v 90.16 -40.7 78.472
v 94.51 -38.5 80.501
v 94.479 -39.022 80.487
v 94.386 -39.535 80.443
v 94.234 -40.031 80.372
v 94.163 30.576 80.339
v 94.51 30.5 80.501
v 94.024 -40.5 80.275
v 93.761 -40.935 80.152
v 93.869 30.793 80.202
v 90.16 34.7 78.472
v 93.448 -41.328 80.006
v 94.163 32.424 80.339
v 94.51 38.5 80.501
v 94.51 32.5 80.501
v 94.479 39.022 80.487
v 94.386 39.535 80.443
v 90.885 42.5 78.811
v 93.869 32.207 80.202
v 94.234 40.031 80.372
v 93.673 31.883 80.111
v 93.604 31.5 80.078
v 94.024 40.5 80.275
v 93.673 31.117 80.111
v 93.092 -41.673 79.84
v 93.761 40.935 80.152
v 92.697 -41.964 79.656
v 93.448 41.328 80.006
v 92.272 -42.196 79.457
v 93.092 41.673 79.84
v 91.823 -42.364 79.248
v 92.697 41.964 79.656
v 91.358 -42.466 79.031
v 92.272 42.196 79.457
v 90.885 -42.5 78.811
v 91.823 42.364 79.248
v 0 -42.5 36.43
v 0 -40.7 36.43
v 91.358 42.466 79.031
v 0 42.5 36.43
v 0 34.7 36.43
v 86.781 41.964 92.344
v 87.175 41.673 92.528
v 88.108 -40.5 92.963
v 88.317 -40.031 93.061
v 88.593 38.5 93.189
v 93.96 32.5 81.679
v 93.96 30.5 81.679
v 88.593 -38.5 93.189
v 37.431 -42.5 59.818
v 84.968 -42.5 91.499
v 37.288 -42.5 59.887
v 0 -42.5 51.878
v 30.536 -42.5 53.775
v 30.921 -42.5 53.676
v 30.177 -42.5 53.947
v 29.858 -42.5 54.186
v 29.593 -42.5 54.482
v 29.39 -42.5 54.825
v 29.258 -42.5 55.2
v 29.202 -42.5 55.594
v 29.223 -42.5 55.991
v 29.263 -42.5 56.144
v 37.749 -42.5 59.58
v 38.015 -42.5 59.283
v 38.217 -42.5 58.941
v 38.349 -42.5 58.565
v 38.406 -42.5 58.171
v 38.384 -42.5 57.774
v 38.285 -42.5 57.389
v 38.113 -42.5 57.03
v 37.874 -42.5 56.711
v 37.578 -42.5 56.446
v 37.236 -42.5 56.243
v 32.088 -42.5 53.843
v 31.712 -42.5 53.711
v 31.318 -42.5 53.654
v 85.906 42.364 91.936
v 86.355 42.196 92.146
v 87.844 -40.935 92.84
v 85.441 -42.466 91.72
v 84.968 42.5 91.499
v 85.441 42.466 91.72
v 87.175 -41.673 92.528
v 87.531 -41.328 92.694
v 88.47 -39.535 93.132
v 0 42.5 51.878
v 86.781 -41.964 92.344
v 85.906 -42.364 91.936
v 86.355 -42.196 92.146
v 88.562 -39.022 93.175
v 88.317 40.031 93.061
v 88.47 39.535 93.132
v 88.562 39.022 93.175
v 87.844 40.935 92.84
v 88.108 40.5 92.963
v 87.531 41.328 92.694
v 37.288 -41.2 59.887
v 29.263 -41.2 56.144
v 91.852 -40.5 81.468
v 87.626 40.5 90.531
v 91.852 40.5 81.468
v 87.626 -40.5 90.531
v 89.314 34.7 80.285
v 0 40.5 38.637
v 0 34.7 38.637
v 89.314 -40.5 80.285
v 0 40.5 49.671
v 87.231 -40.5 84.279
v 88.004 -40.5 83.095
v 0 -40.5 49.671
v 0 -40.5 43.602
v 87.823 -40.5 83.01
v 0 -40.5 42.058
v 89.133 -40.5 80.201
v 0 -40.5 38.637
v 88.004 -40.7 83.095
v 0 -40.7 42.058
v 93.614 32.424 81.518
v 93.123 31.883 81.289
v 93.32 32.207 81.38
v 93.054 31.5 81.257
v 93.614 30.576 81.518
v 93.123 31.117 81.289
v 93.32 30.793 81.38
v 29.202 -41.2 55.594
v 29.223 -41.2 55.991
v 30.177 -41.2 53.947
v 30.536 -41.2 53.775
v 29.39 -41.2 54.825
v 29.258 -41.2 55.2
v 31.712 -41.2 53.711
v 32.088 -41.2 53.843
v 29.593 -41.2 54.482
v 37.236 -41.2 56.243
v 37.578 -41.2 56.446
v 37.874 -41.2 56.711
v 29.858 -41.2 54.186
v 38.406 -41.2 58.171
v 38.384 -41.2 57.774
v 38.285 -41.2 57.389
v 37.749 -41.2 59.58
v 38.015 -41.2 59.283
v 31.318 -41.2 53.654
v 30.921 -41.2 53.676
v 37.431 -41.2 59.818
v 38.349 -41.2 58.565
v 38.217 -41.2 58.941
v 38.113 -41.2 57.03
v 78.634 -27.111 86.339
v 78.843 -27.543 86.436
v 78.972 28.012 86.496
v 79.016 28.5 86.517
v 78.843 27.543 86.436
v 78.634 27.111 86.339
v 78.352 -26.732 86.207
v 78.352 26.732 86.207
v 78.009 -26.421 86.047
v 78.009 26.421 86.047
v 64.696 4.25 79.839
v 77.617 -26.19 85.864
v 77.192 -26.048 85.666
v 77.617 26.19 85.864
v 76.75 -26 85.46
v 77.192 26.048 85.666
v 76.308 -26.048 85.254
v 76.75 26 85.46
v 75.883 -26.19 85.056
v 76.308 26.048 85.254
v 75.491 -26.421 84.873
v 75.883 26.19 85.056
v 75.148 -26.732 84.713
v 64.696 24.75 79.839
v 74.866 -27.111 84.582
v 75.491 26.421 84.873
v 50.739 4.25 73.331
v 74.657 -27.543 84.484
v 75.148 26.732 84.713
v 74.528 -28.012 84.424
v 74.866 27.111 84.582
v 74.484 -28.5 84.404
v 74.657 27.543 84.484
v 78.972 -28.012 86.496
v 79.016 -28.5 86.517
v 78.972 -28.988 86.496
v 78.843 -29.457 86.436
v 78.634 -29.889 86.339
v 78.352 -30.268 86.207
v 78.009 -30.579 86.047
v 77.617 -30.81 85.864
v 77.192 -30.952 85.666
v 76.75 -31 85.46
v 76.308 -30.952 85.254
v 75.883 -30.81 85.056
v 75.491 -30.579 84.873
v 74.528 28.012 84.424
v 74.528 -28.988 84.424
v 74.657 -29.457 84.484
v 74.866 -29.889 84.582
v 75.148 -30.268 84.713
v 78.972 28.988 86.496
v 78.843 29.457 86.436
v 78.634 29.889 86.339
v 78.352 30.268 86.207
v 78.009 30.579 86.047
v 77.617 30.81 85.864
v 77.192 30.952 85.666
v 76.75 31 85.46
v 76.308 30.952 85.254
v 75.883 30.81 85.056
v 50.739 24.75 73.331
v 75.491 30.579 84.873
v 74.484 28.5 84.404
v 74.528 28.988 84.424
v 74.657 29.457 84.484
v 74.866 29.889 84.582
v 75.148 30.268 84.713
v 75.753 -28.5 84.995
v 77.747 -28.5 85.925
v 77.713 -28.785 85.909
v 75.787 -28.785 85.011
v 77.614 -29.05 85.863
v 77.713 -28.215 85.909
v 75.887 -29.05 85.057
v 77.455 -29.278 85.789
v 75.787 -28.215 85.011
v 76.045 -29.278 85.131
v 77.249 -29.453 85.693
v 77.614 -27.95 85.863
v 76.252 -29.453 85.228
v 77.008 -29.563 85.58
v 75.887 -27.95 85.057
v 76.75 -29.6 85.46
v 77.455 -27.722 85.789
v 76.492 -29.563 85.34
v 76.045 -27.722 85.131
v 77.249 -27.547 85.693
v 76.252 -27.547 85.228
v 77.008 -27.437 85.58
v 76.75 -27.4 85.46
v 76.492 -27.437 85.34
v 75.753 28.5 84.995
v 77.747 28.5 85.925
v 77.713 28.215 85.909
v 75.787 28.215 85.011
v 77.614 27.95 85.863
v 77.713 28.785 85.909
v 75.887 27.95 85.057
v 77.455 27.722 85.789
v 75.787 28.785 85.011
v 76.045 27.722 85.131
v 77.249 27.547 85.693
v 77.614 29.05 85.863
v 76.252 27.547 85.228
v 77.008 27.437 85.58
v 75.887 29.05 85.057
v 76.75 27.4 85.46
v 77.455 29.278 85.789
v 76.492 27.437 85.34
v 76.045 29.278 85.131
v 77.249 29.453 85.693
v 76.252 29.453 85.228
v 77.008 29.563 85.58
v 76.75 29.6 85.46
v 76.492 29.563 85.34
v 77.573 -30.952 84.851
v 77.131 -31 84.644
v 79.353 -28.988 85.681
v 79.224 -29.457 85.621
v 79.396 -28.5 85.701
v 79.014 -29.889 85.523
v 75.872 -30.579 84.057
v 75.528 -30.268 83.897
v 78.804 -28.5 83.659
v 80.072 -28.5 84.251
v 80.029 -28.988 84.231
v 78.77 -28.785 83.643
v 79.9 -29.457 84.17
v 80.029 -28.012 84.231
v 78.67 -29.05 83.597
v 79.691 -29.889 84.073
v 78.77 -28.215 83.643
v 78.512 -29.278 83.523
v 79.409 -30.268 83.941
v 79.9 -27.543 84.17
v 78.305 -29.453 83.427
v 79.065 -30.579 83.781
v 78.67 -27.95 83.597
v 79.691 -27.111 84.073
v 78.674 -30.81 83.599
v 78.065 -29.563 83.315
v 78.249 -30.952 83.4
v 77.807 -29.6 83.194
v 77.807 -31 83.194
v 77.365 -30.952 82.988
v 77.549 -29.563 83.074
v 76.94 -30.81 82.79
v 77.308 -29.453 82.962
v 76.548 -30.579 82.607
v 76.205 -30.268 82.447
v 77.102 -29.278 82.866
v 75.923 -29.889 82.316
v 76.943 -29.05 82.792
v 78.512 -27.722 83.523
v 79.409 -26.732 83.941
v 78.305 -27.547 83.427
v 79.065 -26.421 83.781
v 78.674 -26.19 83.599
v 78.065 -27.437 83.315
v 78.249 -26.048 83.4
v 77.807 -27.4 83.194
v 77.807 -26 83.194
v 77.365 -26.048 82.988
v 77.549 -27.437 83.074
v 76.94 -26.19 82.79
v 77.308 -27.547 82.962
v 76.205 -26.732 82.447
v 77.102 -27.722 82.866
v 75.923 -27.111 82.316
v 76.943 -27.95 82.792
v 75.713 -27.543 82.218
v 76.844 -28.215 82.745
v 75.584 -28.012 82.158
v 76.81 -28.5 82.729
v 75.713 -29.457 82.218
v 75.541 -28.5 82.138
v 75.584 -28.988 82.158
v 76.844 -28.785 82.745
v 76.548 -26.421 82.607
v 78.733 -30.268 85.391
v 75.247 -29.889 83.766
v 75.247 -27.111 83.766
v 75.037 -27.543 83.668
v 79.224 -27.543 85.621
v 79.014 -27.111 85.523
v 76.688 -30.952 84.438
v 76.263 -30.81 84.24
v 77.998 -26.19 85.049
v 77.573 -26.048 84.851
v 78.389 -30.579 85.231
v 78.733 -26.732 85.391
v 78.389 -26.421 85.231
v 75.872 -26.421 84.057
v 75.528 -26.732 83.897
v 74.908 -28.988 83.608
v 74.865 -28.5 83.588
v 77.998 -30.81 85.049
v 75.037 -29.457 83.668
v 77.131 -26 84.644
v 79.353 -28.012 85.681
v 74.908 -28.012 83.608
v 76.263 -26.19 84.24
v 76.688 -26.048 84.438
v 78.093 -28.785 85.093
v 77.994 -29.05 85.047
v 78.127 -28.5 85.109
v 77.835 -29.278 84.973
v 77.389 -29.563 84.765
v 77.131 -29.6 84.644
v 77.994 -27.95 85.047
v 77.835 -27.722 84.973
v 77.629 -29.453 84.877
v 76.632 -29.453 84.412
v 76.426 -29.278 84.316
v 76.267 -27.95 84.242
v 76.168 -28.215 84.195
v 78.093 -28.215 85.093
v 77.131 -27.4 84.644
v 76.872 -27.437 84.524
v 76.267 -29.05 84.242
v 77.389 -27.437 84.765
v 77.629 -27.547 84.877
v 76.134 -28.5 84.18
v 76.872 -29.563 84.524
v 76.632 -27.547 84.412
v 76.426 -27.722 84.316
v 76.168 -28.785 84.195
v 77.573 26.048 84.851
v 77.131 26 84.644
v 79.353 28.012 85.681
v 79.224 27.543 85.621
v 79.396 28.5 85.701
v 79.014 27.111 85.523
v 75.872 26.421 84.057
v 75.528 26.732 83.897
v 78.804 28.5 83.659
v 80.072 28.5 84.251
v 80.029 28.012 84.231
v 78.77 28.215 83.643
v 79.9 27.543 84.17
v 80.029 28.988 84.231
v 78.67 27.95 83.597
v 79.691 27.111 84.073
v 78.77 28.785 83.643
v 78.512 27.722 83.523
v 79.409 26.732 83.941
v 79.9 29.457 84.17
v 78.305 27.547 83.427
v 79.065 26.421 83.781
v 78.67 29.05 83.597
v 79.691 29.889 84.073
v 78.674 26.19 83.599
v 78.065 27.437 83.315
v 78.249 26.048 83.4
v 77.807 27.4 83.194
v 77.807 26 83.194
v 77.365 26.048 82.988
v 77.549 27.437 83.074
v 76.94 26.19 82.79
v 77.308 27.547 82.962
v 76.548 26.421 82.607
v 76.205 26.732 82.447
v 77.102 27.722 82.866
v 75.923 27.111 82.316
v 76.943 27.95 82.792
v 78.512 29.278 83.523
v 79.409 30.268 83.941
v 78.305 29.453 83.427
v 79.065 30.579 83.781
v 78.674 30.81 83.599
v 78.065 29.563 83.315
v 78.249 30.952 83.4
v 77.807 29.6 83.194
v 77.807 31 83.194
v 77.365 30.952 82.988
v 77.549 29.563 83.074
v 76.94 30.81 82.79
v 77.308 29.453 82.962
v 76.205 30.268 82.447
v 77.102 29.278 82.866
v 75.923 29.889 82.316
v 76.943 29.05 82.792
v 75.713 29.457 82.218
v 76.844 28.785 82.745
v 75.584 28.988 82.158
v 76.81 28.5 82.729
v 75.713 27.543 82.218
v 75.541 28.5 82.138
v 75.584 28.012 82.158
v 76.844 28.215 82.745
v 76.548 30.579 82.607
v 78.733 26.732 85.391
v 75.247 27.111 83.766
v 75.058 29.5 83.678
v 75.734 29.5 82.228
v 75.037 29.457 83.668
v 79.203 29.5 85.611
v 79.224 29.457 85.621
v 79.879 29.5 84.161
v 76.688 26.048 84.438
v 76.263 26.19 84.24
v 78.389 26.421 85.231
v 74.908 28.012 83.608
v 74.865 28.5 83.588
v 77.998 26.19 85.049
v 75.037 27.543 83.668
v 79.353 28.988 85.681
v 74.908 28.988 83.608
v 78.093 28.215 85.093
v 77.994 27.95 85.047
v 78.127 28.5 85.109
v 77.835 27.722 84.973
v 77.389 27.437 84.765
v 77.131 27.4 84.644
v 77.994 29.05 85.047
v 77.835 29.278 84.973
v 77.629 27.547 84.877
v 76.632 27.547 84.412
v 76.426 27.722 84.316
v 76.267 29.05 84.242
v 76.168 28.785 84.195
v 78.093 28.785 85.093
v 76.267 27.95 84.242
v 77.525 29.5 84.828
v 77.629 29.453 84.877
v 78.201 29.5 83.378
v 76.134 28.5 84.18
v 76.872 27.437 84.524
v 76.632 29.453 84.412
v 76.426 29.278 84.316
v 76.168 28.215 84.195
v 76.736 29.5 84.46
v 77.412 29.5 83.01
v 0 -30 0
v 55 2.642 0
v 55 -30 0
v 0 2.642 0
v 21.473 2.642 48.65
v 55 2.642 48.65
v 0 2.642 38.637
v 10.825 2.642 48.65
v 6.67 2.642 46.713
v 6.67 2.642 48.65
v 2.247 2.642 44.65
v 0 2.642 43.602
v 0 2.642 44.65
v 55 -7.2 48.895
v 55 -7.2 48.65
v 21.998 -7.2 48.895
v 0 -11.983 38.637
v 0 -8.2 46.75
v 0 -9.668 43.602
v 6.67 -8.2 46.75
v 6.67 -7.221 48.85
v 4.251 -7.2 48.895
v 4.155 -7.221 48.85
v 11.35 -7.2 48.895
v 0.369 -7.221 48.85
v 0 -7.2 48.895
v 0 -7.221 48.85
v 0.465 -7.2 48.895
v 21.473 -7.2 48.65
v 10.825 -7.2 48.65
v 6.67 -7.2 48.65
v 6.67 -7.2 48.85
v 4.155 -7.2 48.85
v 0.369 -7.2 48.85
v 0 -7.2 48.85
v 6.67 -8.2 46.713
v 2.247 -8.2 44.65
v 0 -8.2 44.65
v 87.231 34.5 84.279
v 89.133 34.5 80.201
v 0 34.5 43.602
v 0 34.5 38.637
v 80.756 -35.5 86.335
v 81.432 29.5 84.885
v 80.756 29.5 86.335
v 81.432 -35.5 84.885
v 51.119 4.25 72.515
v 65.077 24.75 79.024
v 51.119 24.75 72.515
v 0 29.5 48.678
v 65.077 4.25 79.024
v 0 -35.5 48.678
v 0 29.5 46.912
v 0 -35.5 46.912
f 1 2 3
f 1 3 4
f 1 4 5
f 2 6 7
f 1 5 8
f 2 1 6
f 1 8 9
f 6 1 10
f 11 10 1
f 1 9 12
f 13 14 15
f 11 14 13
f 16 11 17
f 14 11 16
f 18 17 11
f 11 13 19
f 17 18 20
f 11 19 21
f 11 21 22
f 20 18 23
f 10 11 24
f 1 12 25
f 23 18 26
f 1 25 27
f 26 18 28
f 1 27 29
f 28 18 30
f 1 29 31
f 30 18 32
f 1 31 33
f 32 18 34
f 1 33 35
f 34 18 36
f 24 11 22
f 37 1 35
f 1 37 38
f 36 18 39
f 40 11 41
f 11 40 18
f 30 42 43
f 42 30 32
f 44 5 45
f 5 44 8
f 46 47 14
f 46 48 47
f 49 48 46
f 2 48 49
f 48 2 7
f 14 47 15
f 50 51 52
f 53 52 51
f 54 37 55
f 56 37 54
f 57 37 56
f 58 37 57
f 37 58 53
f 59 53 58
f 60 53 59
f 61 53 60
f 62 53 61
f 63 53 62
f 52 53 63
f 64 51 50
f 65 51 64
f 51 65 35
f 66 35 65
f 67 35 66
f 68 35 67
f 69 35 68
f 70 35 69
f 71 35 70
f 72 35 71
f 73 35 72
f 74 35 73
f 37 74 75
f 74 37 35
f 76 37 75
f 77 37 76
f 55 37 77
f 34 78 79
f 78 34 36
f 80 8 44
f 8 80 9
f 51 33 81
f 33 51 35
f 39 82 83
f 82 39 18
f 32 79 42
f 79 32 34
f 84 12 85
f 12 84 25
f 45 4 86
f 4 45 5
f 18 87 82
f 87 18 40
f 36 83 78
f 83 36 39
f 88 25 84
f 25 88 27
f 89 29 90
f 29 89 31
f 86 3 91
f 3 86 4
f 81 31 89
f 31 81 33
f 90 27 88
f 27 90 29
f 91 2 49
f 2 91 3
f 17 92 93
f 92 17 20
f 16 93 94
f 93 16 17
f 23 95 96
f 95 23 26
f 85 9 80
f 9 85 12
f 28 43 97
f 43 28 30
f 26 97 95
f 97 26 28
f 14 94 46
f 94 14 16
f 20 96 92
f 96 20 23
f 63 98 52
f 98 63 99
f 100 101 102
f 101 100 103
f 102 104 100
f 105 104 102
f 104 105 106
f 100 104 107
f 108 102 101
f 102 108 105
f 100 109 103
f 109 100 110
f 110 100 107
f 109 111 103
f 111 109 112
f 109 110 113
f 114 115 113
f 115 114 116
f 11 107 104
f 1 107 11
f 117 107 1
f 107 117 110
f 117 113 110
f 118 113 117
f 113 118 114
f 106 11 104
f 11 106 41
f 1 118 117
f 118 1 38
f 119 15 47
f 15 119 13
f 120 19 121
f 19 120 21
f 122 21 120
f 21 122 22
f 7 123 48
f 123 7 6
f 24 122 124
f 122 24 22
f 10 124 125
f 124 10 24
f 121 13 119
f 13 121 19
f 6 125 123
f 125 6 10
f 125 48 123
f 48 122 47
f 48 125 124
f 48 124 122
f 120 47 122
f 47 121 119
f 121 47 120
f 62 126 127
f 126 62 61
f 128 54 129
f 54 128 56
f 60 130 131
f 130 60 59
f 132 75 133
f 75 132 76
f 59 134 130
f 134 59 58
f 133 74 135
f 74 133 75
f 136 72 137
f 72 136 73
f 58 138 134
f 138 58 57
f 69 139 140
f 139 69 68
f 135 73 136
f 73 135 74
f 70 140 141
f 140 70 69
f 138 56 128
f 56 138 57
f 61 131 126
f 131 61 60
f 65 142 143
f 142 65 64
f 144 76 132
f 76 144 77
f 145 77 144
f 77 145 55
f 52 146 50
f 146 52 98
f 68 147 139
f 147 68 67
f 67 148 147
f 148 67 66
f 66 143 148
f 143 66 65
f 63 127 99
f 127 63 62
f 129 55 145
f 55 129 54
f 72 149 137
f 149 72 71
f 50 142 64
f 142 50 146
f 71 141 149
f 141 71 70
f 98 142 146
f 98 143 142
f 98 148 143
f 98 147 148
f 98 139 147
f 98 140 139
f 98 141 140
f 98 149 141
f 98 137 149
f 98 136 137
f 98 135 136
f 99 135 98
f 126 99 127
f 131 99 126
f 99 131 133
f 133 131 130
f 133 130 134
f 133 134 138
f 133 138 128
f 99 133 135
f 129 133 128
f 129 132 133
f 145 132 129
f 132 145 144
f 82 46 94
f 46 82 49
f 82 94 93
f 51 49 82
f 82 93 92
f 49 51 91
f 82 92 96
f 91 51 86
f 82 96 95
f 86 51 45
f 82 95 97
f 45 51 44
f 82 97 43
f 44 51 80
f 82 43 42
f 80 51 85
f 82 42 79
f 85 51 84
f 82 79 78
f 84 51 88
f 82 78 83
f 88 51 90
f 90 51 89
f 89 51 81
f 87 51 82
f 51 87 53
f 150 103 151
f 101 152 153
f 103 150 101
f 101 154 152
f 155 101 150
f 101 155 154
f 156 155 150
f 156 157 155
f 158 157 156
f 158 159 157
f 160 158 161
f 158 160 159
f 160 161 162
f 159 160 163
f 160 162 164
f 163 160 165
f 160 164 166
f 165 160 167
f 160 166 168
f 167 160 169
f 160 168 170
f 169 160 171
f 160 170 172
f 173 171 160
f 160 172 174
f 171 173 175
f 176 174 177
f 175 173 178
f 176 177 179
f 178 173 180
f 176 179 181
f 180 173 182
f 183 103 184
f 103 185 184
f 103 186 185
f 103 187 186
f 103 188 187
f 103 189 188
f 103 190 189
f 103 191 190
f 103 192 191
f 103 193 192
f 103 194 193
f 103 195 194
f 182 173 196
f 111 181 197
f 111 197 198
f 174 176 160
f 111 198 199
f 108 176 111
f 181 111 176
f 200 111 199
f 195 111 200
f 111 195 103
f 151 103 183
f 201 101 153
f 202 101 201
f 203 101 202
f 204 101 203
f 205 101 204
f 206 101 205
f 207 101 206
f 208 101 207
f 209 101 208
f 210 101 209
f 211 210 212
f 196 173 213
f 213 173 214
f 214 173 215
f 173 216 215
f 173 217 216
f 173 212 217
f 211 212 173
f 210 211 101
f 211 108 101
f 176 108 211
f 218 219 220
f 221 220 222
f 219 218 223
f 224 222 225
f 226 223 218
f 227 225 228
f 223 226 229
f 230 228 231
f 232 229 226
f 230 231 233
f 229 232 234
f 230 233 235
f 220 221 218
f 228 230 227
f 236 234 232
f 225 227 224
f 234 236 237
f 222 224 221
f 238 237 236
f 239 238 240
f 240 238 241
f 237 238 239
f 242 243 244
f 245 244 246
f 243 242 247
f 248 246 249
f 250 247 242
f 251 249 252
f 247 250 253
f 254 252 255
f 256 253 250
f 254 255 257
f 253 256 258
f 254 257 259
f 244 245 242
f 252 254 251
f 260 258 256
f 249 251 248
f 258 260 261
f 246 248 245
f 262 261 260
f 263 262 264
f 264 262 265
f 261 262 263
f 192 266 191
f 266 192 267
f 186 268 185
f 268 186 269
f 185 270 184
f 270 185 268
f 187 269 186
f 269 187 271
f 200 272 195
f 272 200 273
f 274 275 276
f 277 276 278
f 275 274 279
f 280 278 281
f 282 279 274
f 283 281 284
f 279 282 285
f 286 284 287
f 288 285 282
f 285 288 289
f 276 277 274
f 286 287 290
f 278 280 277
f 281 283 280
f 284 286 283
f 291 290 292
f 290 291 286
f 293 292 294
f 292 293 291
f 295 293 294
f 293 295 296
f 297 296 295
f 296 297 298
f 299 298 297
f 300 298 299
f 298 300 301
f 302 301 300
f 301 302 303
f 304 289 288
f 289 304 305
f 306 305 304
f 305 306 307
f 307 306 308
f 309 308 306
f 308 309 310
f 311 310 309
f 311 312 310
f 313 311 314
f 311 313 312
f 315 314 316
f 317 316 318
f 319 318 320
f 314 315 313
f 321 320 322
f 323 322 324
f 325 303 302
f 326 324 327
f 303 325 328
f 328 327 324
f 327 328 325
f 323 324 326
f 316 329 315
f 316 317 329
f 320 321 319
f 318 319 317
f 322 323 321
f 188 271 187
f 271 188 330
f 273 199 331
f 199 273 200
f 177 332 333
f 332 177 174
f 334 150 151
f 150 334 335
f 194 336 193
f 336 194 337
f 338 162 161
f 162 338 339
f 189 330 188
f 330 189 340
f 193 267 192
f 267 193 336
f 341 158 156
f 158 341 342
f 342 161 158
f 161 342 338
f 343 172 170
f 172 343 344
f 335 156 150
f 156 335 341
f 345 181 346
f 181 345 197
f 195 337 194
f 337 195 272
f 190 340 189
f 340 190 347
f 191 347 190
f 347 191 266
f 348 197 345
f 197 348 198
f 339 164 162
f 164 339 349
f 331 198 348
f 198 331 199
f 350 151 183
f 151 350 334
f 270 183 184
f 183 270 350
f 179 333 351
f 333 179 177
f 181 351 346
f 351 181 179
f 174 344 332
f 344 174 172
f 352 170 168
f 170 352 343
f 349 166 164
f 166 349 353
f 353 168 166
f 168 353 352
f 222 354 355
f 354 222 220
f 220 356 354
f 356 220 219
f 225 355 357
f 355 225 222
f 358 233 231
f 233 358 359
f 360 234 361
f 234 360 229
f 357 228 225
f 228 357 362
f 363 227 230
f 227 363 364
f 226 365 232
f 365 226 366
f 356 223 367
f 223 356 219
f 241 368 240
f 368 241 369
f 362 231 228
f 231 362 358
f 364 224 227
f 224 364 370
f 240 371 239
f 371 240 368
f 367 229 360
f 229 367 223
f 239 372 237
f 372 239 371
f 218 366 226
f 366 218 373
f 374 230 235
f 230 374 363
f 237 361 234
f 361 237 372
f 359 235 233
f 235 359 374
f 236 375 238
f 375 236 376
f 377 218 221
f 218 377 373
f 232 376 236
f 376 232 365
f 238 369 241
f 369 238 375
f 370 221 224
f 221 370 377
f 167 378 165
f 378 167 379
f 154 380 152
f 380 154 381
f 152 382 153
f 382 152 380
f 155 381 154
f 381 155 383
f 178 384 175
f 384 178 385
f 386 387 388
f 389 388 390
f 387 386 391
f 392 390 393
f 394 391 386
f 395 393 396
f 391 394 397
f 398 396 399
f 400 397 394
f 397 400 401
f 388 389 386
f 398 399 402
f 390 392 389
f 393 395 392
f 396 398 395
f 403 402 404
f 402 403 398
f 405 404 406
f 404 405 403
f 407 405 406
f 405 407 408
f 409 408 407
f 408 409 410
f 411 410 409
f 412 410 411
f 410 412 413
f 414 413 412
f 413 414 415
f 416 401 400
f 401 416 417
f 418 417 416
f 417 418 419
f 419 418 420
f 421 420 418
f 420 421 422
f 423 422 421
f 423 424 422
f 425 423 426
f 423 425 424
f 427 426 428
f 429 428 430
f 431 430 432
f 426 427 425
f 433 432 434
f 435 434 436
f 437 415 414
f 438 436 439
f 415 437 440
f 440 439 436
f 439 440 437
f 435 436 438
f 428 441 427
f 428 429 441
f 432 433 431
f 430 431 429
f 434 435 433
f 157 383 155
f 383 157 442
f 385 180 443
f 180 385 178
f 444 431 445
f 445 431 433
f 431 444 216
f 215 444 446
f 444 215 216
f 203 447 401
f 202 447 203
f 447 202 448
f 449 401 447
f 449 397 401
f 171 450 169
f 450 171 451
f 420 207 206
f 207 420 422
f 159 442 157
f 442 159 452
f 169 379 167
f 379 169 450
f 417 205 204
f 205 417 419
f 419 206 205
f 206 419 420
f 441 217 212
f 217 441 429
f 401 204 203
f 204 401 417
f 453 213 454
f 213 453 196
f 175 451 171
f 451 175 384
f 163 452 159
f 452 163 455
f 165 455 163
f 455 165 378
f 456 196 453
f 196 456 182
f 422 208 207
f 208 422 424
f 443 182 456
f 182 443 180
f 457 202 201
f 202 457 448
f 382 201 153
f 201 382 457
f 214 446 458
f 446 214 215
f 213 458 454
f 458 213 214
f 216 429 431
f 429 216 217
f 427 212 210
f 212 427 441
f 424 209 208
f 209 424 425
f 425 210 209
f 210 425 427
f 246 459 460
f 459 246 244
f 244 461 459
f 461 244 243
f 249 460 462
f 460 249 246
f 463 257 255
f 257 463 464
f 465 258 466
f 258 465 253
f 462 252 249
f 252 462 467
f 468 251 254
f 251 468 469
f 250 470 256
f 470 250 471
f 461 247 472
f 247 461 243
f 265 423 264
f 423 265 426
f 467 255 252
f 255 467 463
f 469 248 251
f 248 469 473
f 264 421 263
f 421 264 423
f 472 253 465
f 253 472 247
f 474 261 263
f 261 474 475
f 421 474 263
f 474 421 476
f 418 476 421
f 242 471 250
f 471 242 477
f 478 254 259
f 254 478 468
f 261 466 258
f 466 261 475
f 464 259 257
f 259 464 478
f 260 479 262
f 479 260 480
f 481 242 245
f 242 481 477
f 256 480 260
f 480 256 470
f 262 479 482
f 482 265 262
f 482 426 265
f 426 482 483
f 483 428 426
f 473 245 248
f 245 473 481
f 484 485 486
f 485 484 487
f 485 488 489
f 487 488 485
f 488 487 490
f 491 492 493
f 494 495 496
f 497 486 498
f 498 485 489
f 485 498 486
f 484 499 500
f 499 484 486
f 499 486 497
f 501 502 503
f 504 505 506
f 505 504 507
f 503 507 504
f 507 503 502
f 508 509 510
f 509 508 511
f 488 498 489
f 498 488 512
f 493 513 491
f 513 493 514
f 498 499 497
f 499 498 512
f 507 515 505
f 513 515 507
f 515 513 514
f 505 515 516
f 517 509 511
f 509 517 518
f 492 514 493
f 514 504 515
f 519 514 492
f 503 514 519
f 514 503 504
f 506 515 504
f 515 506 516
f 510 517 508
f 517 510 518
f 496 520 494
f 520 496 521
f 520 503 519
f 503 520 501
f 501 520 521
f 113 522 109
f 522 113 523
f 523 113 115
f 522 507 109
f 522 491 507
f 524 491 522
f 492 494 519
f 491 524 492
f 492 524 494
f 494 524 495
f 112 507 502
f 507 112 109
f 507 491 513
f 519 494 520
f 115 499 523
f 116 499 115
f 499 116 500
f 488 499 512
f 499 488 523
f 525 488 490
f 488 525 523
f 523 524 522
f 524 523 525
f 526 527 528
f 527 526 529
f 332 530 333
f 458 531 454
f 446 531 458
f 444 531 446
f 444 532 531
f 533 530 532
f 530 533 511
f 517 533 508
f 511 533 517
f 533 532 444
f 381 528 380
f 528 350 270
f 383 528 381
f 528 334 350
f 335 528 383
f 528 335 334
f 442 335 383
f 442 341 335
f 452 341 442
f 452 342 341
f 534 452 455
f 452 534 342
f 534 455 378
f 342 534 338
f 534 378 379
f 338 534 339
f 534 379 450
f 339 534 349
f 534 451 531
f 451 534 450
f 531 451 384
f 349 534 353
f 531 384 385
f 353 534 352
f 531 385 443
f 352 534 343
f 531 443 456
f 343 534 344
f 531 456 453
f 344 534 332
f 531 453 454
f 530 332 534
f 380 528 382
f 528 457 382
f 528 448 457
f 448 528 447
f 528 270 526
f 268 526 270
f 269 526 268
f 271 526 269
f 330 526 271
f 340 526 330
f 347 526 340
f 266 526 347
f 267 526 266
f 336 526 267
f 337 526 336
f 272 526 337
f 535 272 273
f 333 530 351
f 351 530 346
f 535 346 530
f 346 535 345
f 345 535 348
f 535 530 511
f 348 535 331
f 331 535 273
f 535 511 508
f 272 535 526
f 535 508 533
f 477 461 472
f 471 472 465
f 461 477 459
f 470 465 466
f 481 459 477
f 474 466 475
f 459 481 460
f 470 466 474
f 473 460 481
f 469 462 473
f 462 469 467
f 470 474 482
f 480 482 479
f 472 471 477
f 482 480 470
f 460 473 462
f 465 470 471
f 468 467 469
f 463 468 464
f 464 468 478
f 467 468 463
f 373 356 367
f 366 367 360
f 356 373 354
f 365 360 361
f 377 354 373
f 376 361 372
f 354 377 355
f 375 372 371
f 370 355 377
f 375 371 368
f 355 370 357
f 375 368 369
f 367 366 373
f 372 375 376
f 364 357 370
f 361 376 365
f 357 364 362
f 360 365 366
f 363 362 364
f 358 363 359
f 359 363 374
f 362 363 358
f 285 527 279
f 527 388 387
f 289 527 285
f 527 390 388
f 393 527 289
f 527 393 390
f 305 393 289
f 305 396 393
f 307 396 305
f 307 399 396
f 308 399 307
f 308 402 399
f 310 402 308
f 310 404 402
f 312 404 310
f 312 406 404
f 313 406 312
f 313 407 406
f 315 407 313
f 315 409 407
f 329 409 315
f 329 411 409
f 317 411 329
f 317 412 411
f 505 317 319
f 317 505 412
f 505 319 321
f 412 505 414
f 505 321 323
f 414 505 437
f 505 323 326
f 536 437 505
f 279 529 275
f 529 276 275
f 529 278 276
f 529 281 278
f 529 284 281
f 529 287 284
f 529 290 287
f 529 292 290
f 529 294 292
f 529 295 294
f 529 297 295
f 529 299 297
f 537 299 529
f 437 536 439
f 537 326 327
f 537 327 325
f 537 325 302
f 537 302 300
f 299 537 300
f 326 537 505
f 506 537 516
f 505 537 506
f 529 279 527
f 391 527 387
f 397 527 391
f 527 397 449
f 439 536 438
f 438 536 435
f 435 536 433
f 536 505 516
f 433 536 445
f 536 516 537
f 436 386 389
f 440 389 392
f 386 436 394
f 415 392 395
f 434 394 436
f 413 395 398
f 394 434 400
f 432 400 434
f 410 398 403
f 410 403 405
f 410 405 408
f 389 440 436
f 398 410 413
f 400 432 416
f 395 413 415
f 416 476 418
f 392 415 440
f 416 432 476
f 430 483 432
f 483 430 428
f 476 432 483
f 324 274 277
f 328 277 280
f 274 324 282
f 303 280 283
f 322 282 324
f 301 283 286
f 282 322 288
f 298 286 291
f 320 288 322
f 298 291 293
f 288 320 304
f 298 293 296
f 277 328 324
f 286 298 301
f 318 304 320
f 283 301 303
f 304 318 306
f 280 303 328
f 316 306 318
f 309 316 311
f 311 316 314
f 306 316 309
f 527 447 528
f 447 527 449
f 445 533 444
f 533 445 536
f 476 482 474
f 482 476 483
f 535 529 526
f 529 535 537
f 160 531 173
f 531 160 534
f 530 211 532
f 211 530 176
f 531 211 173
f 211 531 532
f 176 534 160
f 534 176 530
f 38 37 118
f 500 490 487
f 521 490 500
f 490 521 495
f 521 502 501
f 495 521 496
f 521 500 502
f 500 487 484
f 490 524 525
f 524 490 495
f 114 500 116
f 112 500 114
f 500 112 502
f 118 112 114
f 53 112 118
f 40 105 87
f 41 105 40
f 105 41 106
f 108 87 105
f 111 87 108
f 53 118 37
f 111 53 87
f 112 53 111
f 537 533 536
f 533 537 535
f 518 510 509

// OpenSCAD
intersection() {
	union() {
		translate(v = [32.6415360708499, 0, 59.375]) {
			rotate(a = [0, -25.0, 0]) {
				union() {
					difference() {
						difference() {
							difference() {
								difference() {
									difference() {
										difference() {
											union() {
												union() {
													intersection() {
														hull() {
															translate(v = [-61.0, -38.5, 0]) {
																cylinder($fn = 48, center = true, h = 14.0, r = 4.0);
															}
															translate(v = [-61.0, 38.5, 0]) {
																cylinder($fn = 48, center = true, h = 14.0, r = 4.0);
															}
															translate(v = [61.0, -38.5, 0]) {
																cylinder($fn = 48, center = true, h = 14.0, r = 4.0);
															}
															translate(v = [61.0, 38.5, 0]) {
																cylinder($fn = 48, center = true, h = 14.0, r = 4.0);
															}
														}
														translate(v = [0, 0, -4.25]) {
															cube(center = true, size = [132.0, 87.0, 5.5]);
														}
													}
													translate(v = [0, 0, -2.1]) {
														difference() {
															hull() {
																translate(v = [-61.0, -38.5, 0]) {
																	cylinder($fn = 48, center = true, h = 1.2, r = 2.8);
																}
																translate(v = [-61.0, 38.5, 0]) {
																	cylinder($fn = 48, center = true, h = 1.2, r = 2.8);
																}
																translate(v = [61.0, -38.5, 0]) {
																	cylinder($fn = 48, center = true, h = 1.2, r = 2.8);
																}
																translate(v = [61.0, 38.5, 0]) {
																	cylinder($fn = 48, center = true, h = 1.2, r = 2.8);
																}
															}
															hull() {
																translate(v = [-61.0, -38.5, 0]) {
																	cylinder($fn = 48, center = true, h = 1.4, r = 1.2);
																}
																translate(v = [-61.0, 38.5, 0]) {
																	cylinder($fn = 48, center = true, h = 1.4, r = 1.2);
																}
																translate(v = [61.0, -38.5, 0]) {
																	cylinder($fn = 48, center = true, h = 1.4, r = 1.2);
																}
																translate(v = [61.0, 38.5, 0]) {
																	cylinder($fn = 48, center = true, h = 1.4, r = 1.2);
																}
															}
														}
													}
												}
												union() {
													translate(v = [-60.0, 15.75, -2.0]) {
														rotate(a = [0, 0, 90]) {
															union() {
																cube(center = true, size = [8.0, 1.0, 3.0]);
																translate(v = [0, -0.75, 1.5]) {
																	cube(center = true, size = [8.0, 1.5, 1.0]);
																}
															}
														}
													}
													translate(v = [-60.0, -21.75, -2.0]) {
														rotate(a = [0, 0, 90]) {
															union() {
																cube(center = true, size = [8.0, 1.0, 3.0]);
																translate(v = [0, -0.75, 1.5]) {
																	cube(center = true, size = [8.0, 1.5, 1.0]);
																}
															}
														}
													}
													translate(v = [60.0, 15.75, -2.0]) {
														rotate(a = [0, 0, -90]) {
															union() {
																cube(center = true, size = [8.0, 1.0, 3.0]);
																translate(v = [0, -0.75, 1.5]) {
																	cube(center = true, size = [8.0, 1.5, 1.0]);
																}
															}
														}
													}
													translate(v = [60.0, -21.75, -2.0]) {
														rotate(a = [0, 0, -90]) {
															union() {
																cube(center = true, size = [8.0, 1.0, 3.0]);
																translate(v = [0, -0.75, 1.5]) {
																	cube(center = true, size = [8.0, 1.5, 1.0]);
																}
															}
														}
													}
												}
											}
											cube(center = true, size = [126.0, 81.0, 10.0]);
										}
										translate(v = [0, -3.0, -4.5]) {
											cube(center = true, size = [120.4, 75.4, 5.2]);
										}
									}
									translate(v = [0, -3.0, -7.0]) {
										cube(center = true, size = [109.0, 65.8, 2.6]);
									}
								}
								translate(v = [0, -48.5, -7.0]) {
									union() {
										translate(v = [-14.0, 0, 0]) {
											cylinder($fn = 32, center = true, d = 8.0, h = 2.6);
										}
										translate(v = [0.0, 0, 0]) {
											cylinder($fn = 32, center = true, d = 8.0, h = 2.6);
										}
										translate(v = [14.0, 0, 0]) {
											cylinder($fn = 32, center = true, d = 8.0, h = 2.6);
										}
									}
								}
							}
							translate(v = [65.0, 31.5, -7.0]) {
								cylinder($fn = 16, center = true, d = 2.0, h = 2.6);
							}
						}
						translate(v = [0, -42.5, -2.75]) {
							rotate(a = [90, 0, 0]) {
								linear_extrude(center = true, height = 2.6) {
									hull() {
										translate(v = [-2.84, 0]) {
											circle($fn = 32, r = 2.0300000000000002);
										}
										translate(v = [2.84, 0]) {
											circle($fn = 32, r = 2.0300000000000002);
										}
									}
								}
							}
						}
					}
					union() {
						difference() {
							difference() {
								intersection() {
									hull() {
										translate(v = [-61.0, -38.5, 0]) {
											cylinder($fn = 48, center = true, h = 14.0, r = 4.0);
										}
										translate(v = [-61.0, 38.5, 0]) {
											cylinder($fn = 48, center = true, h = 14.0, r = 4.0);
										}
										translate(v = [61.0, -38.5, 0]) {
											cylinder($fn = 48, center = true, h = 14.0, r = 4.0);
										}
										translate(v = [61.0, 38.5, 0]) {
											cylinder($fn = 48, center = true, h = 14.0, r = 4.0);
										}
									}
									translate(v = [0, 0, 2.75]) {
										cube(center = true, size = [132.0, 87.0, 8.5]);
									}
								}
								translate(v = [0, 0, -2.3]) {
									difference() {
										hull() {
											translate(v = [-61.099999999999994, -38.6, 0]) {
												cylinder($fn = 48, center = true, h = 1.6, r = 3.2);
											}
											translate(v = [-61.099999999999994, 38.6, 0]) {
												cylinder($fn = 48, center = true, h = 1.6, r = 3.2);
											}
											translate(v = [61.099999999999994, -38.6, 0]) {
												cylinder($fn = 48, center = true, h = 1.6, r = 3.2);
											}
											translate(v = [61.099999999999994, 38.6, 0]) {
												cylinder($fn = 48, center = true, h = 1.6, r = 3.2);
											}
										}
										hull() {
											translate(v = [-60.9, -38.4, 0]) {
												cylinder($fn = 48, center = true, h = 1.8, r = 0.7999999999999998);
											}
											translate(v = [-60.9, 38.4, 0]) {
												cylinder($fn = 48, center = true, h = 1.8, r = 0.7999999999999998);
											}
											translate(v = [60.9, -38.4, 0]) {
												cylinder($fn = 48, center = true, h = 1.8, r = 0.7999999999999998);
											}
											translate(v = [60.9, 38.4, 0]) {
												cylinder($fn = 48, center = true, h = 1.8, r = 0.7999999999999998);
											}
										}
									}
								}
							}
							cube(center = true, size = [126.0, 81.0, 10.0]);
						}
						union() {
							translate(v = [-51.0, -28.5, 5.0]) {
								rotate(a = [180, 0, 0]) {
									difference() {
										cylinder($fn = 32, center = false, d = 5.0, h = 2.5);
										translate(v = [0, 0, -0.1]) {
											cylinder($fn = 24, center = false, d = 2.2, h = 2.7);
										}
									}
								}
							}
							translate(v = [51.0, -28.5, 5.0]) {
								rotate(a = [180, 0, 0]) {
									difference() {
										cylinder($fn = 32, center = false, d = 5.0, h = 2.5);
										translate(v = [0, 0, -0.1]) {
											cylinder($fn = 24, center = false, d = 2.2, h = 2.7);
										}
									}
								}
							}
							translate(v = [-51.0, 28.5, 5.0]) {
								rotate(a = [180, 0, 0]) {
									difference() {
										cylinder($fn = 32, center = false, d = 5.0, h = 2.5);
										translate(v = [0, 0, -0.1]) {
											cylinder($fn = 24, center = false, d = 2.2, h = 2.7);
										}
									}
								}
							}
							translate(v = [51.0, 28.5, 5.0]) {
								rotate(a = [180, 0, 0]) {
									difference() {
										cylinder($fn = 32, center = false, d = 5.0, h = 2.5);
										translate(v = [0, 0, -0.1]) {
											cylinder($fn = 24, center = false, d = 2.2, h = 2.7);
										}
									}
								}
							}
						}
					}
				}
			}
		}
		color(alpha = 0.85, c = "Sienna") {
			difference() {
				difference() {
					translate(v = [-55.0, -30.0, 0]) {
						rotate(a = [90, 0, 90]) {
							linear_extrude(height = 110.0) {
								polygon(points = [[0, 0], [32.6415360708499, 0], [32.6415360708499, 70.0]]);
							}
						}
					}
					translate(v = [0, 0, 59.375]) {
						cube(center = true, size = [110.2, 14.4, 21.45]);
					}
				}
				translate(v = [0, 0, 46.75]) {
					cube(center = true, size = [13.34, 16.4, 4.2]);
				}
			}
		}
		translate(v = [32.6415360708499, 0, 59.375]) {
			rotate(a = [0, -25.0, 0]) {
				union() {
					translate(v = [0, -3.0, -2.75]) {
						union() {
							color(alpha = 0.5, c = "DodgerBlue") {
								cube(center = true, size = [120.0, 75.0, 4.5]);
							}
							color(alpha = 0.7, c = "LightBlue") {
								translate(v = [0, 0, 1.75]) {
									cube(center = true, size = [108.0, 64.8, 1.0]);
								}
							}
						}
					}
					translate(v = [0, -3.0, 3.3]) {
						union() {
							color(alpha = 0.5, c = "ForestGreen") {
								cube(center = true, size = [110.0, 65.0, 1.6]);
							}
							color(alpha = 0.6, c = "DarkGreen") {
								translate(v = [30.0, 17.5, 2.0]) {
									cube(center = true, size = [15.4, 20.5, 2.4]);
								}
							}
						}
					}
				}
			}
		}
	}
	translate(v = [250.0, 0, 0]) {
		cube(center = true, size = [500, 1000, 1000]);
	}
}
